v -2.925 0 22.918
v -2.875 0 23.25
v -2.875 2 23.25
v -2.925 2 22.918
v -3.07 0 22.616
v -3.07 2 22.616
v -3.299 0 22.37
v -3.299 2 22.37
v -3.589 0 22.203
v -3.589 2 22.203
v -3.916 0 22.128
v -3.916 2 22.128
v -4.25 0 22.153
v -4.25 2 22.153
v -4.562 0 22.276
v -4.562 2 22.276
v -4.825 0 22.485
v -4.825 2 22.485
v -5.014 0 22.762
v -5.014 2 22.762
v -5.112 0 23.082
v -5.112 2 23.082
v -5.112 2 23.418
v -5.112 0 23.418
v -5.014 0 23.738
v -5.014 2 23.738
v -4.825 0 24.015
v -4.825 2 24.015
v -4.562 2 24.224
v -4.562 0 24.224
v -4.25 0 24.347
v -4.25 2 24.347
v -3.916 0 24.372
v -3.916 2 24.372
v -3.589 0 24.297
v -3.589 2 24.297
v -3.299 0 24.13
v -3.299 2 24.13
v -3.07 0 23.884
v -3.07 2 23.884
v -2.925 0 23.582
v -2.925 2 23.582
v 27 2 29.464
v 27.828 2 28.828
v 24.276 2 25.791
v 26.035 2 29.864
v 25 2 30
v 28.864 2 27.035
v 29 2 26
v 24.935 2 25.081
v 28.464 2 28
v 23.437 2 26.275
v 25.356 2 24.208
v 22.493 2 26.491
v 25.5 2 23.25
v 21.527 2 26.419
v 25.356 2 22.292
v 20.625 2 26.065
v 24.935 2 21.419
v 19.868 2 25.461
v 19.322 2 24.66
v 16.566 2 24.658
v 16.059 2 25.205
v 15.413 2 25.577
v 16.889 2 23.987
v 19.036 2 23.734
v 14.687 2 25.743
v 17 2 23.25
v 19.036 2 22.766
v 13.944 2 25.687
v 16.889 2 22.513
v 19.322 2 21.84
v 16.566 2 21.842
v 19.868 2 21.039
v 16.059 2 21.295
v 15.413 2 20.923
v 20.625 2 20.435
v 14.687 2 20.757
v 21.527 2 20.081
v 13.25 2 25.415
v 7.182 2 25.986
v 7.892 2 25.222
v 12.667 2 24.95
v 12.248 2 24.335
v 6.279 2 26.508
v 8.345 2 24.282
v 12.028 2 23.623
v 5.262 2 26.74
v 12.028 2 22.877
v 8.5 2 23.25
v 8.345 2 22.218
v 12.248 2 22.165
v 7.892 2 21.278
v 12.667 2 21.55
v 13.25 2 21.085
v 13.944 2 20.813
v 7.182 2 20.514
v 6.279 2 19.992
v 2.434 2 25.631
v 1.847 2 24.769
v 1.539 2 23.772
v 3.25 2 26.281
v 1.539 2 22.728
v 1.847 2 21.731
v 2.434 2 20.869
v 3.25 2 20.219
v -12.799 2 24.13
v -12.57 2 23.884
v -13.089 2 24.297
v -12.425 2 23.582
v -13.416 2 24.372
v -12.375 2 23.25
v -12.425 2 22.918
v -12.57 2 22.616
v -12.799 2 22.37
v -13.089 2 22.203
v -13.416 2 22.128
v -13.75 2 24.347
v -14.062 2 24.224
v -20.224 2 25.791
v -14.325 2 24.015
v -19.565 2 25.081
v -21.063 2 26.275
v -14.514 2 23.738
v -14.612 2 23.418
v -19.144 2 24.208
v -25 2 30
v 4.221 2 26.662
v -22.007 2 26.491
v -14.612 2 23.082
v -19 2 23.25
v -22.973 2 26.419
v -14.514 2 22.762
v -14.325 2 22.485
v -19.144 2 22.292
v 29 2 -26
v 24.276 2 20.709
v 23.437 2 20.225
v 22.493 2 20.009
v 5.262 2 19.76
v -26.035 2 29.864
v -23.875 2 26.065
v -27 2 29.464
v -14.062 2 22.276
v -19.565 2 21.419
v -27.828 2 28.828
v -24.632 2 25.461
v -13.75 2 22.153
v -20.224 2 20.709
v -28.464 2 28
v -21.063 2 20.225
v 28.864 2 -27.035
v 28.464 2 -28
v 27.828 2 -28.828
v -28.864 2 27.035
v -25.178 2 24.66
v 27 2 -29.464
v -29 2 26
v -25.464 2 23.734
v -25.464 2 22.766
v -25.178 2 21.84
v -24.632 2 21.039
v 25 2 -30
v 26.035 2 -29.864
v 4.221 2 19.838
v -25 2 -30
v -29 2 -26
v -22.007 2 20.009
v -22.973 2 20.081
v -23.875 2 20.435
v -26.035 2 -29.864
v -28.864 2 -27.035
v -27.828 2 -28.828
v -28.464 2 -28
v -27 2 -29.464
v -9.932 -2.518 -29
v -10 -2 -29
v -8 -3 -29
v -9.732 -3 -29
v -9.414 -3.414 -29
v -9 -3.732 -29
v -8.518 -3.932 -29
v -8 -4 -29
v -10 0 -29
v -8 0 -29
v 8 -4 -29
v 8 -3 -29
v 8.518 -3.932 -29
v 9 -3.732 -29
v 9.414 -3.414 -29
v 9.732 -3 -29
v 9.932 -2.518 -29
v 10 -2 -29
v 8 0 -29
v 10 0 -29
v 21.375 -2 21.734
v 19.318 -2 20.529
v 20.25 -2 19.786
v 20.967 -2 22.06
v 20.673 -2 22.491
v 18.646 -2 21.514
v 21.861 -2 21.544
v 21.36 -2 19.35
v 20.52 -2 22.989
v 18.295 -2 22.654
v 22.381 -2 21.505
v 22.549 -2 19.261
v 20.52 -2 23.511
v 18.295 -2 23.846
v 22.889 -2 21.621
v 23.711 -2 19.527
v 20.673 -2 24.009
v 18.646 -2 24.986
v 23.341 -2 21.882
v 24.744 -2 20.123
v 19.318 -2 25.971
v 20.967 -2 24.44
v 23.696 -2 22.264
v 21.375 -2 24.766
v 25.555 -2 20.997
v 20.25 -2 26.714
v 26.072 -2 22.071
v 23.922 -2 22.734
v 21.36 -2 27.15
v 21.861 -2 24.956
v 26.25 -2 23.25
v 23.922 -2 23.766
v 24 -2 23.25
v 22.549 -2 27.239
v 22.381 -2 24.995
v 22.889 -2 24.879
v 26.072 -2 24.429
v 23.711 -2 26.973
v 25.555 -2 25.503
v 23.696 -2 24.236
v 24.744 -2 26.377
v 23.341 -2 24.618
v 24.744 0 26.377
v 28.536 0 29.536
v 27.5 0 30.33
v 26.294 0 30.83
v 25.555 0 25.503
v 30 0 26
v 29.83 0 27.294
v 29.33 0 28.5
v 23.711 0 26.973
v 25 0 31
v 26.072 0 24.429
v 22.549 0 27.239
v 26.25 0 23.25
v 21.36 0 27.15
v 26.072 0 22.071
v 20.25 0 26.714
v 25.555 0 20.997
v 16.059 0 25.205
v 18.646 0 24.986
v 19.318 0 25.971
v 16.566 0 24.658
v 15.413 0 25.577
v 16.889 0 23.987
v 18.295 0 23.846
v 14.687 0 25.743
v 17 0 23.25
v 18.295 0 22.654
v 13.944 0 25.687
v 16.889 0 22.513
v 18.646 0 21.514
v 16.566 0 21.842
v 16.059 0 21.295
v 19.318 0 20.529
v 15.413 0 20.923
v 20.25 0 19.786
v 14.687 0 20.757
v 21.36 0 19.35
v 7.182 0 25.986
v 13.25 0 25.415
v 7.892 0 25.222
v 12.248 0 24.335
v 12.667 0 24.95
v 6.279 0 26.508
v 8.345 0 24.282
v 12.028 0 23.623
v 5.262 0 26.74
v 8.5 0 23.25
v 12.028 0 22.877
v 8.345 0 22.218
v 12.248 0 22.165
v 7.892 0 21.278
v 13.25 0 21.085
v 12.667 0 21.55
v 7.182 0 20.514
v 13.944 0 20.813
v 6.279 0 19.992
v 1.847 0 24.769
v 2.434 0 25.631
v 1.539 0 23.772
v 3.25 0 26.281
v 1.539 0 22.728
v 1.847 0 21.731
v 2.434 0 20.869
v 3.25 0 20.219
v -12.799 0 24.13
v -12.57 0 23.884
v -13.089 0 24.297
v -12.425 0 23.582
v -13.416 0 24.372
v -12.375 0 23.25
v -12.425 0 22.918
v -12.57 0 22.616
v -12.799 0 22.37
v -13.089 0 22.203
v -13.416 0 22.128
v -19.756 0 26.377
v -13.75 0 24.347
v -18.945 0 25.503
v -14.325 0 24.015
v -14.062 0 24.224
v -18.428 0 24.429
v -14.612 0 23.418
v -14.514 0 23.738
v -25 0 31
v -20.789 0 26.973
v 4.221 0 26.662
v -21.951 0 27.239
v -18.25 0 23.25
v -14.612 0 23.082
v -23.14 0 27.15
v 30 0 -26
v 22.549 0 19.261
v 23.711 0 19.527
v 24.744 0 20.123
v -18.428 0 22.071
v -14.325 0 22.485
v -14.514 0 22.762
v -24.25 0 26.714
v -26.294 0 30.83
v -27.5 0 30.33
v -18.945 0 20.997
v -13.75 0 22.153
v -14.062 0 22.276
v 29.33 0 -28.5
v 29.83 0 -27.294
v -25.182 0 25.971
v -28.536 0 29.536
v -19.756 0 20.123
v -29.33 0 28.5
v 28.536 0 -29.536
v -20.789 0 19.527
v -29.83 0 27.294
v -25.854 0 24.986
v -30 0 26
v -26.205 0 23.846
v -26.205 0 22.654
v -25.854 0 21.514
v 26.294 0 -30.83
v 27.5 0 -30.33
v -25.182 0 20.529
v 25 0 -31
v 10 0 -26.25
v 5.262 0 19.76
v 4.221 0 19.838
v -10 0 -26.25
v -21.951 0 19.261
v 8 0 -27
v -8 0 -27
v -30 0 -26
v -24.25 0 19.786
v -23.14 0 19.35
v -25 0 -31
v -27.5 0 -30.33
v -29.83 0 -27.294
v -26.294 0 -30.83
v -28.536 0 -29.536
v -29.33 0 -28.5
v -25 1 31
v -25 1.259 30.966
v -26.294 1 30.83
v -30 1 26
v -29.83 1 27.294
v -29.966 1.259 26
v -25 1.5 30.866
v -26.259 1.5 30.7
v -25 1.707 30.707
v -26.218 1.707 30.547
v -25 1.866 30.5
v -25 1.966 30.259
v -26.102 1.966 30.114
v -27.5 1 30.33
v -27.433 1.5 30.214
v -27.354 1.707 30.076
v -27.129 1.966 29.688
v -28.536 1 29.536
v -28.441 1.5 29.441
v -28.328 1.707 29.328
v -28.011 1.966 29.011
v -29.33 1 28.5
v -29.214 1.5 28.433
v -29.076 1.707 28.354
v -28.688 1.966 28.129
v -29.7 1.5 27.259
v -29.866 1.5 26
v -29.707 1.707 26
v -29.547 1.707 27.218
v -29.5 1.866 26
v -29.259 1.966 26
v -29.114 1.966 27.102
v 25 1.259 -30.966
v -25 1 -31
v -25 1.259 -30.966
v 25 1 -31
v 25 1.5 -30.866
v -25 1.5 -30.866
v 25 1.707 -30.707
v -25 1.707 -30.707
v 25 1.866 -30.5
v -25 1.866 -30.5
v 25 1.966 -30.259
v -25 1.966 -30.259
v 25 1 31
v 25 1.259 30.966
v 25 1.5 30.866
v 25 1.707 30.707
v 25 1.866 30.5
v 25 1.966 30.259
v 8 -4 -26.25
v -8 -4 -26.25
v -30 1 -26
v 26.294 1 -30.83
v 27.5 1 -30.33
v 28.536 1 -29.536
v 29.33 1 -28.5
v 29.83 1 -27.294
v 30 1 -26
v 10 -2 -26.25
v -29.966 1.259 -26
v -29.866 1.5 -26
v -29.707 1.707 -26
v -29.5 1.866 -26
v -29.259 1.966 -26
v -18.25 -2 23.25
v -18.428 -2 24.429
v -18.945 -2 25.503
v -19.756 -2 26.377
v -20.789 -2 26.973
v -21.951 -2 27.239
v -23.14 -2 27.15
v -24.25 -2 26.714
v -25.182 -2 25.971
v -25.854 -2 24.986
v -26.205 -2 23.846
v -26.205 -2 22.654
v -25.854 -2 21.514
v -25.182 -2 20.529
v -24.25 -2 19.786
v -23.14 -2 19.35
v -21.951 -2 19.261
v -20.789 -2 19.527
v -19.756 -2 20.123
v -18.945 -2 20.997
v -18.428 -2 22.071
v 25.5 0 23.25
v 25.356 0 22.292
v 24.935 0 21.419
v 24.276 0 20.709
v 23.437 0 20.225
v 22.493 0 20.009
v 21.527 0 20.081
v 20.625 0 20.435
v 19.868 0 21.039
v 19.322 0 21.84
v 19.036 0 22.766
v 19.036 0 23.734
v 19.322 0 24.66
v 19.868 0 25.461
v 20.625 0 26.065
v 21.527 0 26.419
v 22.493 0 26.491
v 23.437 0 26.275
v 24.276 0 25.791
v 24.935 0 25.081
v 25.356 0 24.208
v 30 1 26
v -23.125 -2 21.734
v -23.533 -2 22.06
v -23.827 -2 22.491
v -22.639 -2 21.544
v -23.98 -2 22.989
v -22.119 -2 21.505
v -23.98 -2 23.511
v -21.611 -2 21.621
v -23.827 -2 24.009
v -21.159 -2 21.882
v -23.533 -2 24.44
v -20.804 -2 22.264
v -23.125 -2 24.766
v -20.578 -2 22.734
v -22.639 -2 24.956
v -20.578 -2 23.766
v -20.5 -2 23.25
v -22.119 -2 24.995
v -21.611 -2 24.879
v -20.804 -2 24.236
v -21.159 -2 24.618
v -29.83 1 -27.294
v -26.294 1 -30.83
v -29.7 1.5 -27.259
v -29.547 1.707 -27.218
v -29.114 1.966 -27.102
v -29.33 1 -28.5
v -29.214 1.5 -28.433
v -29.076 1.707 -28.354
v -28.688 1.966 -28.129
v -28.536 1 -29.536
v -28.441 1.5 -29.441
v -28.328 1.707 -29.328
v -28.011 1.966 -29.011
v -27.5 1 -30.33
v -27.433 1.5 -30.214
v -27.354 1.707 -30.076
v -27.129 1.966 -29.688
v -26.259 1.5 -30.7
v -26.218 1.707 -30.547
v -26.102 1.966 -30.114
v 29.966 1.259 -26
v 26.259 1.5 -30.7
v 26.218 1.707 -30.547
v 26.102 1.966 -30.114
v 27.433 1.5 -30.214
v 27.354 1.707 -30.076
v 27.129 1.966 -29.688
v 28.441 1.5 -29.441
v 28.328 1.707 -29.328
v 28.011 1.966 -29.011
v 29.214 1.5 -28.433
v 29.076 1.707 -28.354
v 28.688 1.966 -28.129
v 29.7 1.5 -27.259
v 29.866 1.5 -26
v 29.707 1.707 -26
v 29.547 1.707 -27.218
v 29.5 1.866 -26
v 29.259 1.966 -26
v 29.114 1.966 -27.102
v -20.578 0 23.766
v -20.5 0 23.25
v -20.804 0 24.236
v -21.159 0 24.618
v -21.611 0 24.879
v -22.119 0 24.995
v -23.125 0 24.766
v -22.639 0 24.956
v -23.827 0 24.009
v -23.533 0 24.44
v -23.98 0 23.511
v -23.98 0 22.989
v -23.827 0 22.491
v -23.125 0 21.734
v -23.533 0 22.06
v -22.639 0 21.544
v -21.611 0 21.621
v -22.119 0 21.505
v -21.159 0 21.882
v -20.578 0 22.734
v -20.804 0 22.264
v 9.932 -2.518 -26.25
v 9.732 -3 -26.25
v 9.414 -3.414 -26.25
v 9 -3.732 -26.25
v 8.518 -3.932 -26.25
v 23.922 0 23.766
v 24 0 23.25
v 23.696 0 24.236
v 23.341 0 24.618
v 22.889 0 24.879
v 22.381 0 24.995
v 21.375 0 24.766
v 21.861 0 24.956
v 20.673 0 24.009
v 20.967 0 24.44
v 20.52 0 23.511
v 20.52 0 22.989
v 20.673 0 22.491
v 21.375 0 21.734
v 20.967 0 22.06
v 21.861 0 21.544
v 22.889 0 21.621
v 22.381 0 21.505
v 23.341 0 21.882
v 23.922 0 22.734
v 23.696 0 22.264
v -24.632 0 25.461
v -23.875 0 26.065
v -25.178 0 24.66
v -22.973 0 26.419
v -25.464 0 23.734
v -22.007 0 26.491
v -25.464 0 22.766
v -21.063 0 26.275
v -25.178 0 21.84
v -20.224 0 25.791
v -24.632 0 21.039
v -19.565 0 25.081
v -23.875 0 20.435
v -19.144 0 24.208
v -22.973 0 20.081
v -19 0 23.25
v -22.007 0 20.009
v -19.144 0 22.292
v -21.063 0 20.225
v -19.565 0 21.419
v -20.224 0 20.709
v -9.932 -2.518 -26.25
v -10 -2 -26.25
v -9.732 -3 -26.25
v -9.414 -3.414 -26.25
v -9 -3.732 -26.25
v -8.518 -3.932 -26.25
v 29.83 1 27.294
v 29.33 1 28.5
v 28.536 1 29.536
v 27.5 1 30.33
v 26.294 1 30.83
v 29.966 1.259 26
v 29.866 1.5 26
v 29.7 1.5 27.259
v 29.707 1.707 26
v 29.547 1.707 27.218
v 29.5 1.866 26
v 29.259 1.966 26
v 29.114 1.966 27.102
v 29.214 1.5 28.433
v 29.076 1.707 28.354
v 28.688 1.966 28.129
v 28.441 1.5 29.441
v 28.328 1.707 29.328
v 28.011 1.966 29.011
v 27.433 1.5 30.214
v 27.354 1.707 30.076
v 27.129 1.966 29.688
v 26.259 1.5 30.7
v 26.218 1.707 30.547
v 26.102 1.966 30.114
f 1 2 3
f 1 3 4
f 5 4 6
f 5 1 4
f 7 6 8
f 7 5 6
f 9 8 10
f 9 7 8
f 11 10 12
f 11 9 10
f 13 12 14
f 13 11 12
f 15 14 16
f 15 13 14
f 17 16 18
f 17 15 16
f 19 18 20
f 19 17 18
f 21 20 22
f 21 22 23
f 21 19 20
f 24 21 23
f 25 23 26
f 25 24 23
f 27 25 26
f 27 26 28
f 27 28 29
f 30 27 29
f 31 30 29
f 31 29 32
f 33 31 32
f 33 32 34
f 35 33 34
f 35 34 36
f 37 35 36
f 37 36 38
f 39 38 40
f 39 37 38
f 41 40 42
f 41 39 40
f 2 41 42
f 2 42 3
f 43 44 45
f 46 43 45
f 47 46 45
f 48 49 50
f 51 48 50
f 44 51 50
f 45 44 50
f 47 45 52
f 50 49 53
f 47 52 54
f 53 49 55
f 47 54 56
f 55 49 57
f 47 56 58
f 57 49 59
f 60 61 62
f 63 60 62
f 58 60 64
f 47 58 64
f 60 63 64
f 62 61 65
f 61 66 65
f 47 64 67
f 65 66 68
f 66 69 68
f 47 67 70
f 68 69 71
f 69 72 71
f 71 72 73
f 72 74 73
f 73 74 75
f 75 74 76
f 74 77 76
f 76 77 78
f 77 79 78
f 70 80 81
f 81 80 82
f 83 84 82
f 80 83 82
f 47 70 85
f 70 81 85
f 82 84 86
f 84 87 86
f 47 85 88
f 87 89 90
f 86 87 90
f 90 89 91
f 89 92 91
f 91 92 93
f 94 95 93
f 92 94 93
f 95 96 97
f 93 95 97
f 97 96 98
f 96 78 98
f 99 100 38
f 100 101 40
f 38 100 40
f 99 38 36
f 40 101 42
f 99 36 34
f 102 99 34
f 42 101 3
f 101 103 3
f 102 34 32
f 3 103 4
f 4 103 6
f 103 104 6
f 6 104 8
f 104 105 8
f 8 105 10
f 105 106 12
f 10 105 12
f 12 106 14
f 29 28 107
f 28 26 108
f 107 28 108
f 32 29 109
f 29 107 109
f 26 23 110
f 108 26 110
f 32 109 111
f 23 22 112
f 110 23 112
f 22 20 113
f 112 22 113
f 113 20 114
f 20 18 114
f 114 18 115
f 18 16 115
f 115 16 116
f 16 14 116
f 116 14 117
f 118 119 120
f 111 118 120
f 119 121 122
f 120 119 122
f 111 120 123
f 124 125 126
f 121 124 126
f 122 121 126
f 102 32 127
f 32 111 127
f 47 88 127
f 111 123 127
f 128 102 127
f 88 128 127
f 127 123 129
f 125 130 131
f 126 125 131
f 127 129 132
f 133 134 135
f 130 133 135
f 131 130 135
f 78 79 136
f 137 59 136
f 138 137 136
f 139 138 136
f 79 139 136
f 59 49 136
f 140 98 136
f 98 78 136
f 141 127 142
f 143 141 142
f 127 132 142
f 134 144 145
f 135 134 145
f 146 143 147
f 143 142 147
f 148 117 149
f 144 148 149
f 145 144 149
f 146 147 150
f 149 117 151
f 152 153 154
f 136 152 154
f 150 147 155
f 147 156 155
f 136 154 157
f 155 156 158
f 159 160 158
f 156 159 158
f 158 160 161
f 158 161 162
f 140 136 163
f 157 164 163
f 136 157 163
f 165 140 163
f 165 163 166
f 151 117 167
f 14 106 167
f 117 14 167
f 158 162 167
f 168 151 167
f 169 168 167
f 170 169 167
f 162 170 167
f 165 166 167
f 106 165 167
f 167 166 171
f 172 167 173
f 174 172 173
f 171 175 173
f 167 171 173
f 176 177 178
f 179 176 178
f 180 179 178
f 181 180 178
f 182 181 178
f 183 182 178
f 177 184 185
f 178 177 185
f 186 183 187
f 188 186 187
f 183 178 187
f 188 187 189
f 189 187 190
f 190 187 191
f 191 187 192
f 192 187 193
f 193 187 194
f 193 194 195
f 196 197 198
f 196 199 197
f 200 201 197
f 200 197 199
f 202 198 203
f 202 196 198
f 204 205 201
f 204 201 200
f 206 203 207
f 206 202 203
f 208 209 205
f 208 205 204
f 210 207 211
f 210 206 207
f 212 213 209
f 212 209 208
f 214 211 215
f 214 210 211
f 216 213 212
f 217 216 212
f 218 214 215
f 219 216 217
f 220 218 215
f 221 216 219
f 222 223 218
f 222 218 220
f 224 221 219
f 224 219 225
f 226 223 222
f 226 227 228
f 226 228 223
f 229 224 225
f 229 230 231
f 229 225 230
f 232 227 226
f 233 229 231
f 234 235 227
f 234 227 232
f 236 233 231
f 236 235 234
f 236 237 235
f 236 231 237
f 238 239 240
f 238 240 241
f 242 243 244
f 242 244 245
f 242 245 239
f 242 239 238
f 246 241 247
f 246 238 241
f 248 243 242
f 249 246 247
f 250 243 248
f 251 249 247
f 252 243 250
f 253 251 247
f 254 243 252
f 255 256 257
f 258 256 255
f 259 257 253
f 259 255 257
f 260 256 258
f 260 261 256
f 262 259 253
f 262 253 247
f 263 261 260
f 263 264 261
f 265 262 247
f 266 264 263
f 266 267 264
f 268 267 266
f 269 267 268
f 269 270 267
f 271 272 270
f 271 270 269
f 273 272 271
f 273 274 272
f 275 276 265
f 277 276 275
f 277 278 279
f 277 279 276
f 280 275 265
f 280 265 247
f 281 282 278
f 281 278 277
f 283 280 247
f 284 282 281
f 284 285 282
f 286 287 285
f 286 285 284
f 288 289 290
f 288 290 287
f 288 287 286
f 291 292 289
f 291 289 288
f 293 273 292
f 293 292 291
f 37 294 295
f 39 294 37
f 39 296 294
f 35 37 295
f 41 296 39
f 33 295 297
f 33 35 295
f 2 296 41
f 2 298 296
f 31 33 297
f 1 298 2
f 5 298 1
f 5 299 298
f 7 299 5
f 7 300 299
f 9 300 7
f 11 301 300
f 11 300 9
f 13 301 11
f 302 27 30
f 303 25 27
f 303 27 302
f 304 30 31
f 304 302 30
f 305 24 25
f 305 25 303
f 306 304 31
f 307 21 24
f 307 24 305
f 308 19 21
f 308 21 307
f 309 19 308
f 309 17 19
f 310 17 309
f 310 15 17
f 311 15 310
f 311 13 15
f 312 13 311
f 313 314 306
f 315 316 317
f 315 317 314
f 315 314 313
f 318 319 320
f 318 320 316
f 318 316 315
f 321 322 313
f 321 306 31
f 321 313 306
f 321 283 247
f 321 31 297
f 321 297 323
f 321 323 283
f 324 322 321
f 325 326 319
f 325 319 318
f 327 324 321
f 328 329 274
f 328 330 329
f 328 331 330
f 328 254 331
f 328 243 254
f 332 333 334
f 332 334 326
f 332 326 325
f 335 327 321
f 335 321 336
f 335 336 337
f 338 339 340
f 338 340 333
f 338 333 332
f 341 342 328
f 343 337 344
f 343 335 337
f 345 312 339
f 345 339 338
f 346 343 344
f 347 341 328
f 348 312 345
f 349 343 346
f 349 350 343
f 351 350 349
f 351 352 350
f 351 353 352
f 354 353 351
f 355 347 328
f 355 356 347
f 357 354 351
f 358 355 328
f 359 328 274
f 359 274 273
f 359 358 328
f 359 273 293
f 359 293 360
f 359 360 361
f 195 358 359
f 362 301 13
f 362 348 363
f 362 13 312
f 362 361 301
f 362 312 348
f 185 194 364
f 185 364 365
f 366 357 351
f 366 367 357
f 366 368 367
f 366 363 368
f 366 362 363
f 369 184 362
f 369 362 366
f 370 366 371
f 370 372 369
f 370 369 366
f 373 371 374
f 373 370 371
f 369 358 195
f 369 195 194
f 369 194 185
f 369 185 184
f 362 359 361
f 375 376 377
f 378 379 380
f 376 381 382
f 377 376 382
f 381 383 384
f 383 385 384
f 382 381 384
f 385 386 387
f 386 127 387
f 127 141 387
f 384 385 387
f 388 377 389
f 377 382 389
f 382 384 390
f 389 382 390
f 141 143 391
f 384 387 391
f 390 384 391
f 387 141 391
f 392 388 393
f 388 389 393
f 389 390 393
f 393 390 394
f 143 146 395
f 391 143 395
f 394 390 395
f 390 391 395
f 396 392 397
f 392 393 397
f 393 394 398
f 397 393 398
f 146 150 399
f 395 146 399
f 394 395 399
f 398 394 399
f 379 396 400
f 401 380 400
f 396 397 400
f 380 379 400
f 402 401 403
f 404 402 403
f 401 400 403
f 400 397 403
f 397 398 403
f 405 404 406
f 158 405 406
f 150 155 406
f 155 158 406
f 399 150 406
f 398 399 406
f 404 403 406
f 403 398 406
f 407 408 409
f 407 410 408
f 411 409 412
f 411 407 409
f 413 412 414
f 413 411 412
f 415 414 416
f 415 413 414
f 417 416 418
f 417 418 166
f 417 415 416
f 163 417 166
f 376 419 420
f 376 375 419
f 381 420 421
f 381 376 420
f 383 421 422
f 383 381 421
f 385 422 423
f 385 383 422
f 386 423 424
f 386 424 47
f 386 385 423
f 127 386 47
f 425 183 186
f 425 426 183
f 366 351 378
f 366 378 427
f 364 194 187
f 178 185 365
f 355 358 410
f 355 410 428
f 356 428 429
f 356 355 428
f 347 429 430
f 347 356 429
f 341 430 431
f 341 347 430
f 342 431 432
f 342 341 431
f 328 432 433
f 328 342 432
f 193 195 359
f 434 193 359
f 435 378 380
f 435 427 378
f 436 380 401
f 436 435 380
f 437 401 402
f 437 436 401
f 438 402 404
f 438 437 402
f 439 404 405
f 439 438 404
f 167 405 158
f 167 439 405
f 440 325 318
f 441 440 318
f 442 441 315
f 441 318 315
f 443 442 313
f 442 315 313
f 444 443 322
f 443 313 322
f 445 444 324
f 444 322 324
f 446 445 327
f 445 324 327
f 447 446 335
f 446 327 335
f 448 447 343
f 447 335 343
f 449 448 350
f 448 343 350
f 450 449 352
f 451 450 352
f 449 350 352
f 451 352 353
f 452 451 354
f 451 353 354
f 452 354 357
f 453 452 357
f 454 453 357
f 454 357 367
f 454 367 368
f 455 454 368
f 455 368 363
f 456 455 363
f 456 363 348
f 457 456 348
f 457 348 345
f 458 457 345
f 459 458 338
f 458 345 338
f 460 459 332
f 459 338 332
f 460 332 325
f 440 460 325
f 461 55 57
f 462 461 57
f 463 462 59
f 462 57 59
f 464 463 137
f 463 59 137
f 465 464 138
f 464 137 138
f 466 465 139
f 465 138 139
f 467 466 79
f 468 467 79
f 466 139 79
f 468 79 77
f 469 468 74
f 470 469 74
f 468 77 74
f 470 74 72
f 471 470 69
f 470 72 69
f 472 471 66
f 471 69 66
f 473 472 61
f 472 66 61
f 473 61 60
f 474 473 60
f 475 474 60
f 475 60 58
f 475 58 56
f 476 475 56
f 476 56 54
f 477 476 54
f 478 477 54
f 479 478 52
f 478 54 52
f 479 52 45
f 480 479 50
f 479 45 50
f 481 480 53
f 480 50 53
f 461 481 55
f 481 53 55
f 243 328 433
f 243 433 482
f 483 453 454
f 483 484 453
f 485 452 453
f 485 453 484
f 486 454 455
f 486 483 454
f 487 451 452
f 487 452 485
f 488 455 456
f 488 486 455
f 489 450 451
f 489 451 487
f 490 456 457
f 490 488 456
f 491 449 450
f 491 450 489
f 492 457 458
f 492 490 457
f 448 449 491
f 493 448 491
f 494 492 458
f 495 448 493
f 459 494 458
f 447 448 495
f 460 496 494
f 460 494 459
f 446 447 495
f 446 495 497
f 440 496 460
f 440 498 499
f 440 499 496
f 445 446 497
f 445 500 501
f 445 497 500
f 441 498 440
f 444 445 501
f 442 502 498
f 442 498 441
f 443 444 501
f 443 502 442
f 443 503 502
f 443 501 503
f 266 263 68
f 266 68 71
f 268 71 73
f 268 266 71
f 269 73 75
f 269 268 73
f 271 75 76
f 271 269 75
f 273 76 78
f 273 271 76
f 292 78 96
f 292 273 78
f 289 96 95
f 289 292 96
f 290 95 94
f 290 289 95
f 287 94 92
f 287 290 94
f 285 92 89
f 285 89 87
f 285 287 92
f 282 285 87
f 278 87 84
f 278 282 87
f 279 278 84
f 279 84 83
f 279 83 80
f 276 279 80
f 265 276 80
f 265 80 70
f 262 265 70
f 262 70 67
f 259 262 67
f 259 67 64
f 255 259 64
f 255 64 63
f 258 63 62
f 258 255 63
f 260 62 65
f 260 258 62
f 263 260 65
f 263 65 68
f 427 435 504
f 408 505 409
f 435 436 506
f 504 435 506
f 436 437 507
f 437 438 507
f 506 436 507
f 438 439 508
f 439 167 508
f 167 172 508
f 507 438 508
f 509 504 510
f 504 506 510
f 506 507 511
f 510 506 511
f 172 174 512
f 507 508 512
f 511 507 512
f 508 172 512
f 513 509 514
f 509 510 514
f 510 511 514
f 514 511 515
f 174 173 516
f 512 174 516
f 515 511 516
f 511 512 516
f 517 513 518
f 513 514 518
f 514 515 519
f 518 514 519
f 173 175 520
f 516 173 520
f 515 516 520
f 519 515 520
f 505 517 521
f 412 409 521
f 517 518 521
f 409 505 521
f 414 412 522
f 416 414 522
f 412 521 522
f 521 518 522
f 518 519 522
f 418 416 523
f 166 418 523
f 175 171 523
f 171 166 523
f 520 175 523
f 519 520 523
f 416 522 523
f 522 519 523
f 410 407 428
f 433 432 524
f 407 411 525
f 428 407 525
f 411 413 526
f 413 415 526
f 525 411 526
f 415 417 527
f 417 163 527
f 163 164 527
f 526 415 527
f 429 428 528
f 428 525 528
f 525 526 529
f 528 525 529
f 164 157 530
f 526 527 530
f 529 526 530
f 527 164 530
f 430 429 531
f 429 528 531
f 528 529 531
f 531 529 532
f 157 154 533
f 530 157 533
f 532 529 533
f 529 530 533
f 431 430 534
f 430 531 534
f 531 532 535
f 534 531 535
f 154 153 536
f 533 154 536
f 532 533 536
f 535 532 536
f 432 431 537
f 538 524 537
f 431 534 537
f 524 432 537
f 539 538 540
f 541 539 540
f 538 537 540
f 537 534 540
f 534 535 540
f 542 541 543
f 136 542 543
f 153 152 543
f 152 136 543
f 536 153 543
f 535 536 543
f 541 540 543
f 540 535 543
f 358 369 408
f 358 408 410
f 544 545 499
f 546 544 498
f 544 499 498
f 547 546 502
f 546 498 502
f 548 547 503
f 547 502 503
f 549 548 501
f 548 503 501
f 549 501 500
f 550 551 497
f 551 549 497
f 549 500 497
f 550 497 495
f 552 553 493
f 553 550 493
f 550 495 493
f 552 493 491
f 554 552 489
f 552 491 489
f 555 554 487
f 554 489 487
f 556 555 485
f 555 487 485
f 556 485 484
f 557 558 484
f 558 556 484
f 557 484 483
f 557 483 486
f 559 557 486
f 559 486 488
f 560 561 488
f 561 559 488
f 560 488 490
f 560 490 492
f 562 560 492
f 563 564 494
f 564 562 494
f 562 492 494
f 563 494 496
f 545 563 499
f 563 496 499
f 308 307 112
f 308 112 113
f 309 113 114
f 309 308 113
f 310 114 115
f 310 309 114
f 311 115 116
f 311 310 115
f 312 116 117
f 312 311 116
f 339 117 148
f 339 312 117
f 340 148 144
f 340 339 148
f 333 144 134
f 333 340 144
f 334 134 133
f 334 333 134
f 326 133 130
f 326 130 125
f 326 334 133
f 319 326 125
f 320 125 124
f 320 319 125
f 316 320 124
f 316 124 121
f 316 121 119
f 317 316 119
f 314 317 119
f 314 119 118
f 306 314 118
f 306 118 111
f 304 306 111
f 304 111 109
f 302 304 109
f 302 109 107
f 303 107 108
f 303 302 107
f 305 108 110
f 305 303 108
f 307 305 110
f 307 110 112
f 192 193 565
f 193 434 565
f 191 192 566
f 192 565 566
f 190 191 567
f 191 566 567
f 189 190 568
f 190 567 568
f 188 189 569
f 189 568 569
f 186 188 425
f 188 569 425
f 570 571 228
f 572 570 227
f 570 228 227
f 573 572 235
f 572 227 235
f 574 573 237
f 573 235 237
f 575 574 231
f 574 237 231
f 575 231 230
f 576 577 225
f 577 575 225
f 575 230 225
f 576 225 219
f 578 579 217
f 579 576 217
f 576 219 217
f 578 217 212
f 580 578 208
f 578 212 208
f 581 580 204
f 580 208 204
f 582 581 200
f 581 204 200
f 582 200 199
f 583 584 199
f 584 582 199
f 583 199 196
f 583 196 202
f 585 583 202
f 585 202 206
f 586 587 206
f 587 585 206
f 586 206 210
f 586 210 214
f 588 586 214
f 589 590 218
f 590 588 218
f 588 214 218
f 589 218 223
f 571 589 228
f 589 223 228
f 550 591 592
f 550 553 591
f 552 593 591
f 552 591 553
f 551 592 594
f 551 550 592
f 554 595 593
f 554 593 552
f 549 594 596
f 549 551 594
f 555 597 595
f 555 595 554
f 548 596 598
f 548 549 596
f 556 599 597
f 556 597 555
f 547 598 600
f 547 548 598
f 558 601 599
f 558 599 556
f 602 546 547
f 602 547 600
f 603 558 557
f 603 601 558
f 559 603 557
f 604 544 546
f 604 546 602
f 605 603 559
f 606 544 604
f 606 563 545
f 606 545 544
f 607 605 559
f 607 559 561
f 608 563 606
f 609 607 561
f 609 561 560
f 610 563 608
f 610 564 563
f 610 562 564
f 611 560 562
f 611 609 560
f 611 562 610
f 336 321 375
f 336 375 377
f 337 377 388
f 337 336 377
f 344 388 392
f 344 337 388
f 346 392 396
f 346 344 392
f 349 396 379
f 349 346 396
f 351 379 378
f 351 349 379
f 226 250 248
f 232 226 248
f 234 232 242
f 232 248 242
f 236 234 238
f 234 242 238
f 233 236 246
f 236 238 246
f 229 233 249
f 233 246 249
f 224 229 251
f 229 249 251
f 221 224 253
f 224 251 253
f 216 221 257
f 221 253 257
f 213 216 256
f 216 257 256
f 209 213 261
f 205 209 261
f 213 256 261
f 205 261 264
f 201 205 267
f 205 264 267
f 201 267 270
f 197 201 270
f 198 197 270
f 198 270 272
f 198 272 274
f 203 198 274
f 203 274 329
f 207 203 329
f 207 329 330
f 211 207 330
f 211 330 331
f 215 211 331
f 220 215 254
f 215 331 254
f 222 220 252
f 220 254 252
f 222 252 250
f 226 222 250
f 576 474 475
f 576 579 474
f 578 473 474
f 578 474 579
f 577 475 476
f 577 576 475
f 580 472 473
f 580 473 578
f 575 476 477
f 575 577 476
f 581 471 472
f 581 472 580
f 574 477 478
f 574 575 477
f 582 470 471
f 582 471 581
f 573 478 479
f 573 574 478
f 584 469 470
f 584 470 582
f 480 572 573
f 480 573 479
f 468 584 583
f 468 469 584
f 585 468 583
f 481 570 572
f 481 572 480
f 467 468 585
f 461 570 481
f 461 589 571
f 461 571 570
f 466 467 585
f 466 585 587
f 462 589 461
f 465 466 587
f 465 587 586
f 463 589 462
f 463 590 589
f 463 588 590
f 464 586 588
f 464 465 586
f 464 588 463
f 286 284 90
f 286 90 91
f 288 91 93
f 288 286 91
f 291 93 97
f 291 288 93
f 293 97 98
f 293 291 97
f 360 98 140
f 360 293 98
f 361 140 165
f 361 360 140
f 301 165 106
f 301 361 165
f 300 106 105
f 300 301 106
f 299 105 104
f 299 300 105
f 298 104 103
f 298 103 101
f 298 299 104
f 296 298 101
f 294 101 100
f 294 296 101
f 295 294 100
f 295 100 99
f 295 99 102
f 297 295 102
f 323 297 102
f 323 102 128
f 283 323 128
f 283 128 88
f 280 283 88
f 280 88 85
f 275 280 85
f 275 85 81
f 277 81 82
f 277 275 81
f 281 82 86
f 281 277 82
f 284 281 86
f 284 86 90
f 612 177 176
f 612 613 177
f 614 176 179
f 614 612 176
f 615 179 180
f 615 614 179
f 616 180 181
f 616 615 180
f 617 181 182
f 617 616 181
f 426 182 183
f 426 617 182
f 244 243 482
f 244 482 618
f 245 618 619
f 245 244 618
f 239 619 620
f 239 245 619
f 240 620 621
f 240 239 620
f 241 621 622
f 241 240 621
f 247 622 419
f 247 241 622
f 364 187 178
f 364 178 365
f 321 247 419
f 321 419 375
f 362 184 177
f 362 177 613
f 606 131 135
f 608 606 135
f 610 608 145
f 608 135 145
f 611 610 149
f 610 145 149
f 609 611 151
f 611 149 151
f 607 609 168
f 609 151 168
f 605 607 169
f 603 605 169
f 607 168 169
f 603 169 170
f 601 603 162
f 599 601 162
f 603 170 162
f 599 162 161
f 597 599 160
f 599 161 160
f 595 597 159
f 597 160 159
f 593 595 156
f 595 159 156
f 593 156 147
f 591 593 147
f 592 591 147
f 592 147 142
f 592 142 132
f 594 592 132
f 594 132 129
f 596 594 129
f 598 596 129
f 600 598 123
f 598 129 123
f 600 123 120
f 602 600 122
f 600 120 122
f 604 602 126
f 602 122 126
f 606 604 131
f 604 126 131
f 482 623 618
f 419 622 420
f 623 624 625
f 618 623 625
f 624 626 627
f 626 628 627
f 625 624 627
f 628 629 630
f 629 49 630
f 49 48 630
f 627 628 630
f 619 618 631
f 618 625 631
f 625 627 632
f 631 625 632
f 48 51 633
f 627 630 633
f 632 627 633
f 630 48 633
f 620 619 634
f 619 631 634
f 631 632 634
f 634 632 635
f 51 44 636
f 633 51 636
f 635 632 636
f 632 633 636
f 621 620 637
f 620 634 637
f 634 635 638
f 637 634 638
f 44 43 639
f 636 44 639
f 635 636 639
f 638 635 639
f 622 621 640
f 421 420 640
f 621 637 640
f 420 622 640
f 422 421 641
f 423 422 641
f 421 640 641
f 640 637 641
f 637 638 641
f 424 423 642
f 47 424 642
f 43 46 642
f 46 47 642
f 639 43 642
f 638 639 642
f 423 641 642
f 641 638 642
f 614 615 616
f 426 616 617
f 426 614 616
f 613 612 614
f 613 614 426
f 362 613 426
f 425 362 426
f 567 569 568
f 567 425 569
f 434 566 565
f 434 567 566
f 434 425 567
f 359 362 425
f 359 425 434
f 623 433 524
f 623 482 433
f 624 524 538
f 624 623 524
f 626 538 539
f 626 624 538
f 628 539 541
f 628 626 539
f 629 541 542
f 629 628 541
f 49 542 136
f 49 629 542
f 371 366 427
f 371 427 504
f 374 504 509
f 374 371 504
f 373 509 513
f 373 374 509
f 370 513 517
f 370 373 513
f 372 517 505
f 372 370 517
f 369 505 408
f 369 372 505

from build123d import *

# Parameters (mm, degrees)
SKETCH1_R           = 1.125
SKETCH1_R_2         = 2.5
SKETCH1_R_3         = 3.5
BOSS_EXTRUDE1_DEPTH = 2
SKETCH2_R           = 4
BOSS_EXTRUDE2_DEPTH = 2
SKETCH3_R           = 1.75
CUT_EXTRUDE1_DEPTH  = 5
SKETCH4_R           = 3.25
SKETCH4_R_2         = 1.75
CUT_EXTRUDE2_DEPTH  = 2
SKETCH6_W           = 20
SKETCH6_H           = 2.75
BOSS_EXTRUDE3_DEPTH = 4
CUT_EXTRUDE3_DEPTH  = 16
FILLET1_R           = 2
FILLET2_R           = 1


with BuildPart() as part:
    # Sketch1 → Boss-Extrude1 (new body)
    with BuildSketch(Plane(origin=(0, 0, 0), x_dir=(1, 0, 0), z_dir=(0, 1, 0))):
        with BuildLine():
            Line((25, -31), (-25, -31))
            ThreePointArc((-25, -31), (-28.535533906, -29.535533906), (-30, -26))
            Line((-30, -26), (-30, 26))
            ThreePointArc((-30, 26), (-28.535533906, 29.535533906), (-25, 31))
            Line((-25, 31), (25, 31))
            ThreePointArc((25, 31), (28.535533906, 29.535533906), (30, 26))
            Line((30, 26), (30, -26))
            ThreePointArc((30, -26), (28.535533906, -29.535533906), (25, -31))
        make_face()
        with Locations((-13.5, -23.25)):
            Circle(SKETCH1_R, mode=Mode.SUBTRACT)
        with Locations((-4, -23.25)):
            Circle(SKETCH1_R, mode=Mode.SUBTRACT)
        with Locations((14.5, -23.25)):
            Circle(SKETCH1_R_2, mode=Mode.SUBTRACT)
        with Locations((5, -23.25)):
            Circle(SKETCH1_R_3, mode=Mode.SUBTRACT)
    extrude(amount=BOSS_EXTRUDE1_DEPTH)

    # Sketch2 → Boss-Extrude2 (add)
    with BuildSketch(Plane.XZ):
        with Locations((-22.25, 23.25)):
            Circle(SKETCH2_R)
        with Locations((22.25, 23.25)):
            Circle(SKETCH2_R)
    extrude(amount=BOSS_EXTRUDE2_DEPTH)

    # Sketch3 → Cut-Extrude1 (cut, through all)
    with BuildSketch(Plane.XZ.offset(2)):
        with Locations((-22.25, 23.25)):
            Circle(SKETCH3_R)
        with Locations((22.25, 23.25)):
            Circle(SKETCH3_R)
    extrude(amount=-CUT_EXTRUDE1_DEPTH, mode=Mode.SUBTRACT)

    # Sketch4 → Cut-Extrude2 (cut)
    with BuildSketch(Plane(origin=(0, 2, 0), x_dir=(1, 0, 0), z_dir=(0, 1, 0))):
        with Locations((-22.25, -23.25)):
            Circle(SKETCH4_R)
        with Locations((-22.25, -23.25)):
            Circle(SKETCH4_R_2, mode=Mode.SUBTRACT)
        with Locations((22.25, -23.25)):
            Circle(SKETCH4_R)
        with Locations((22.25, -23.25)):
            Circle(SKETCH4_R_2, mode=Mode.SUBTRACT)
    extrude(amount=-CUT_EXTRUDE2_DEPTH, mode=Mode.SUBTRACT)

    # Sketch6 → Boss-Extrude3 (add)
    with BuildSketch(Plane.XZ):
        with Locations((0, -27.625)):
            Rectangle(SKETCH6_W, SKETCH6_H)
    extrude(amount=BOSS_EXTRUDE3_DEPTH)

    # Sketch7 → Cut-Extrude3 (cut)
    with BuildSketch(Plane(origin=(8, 0, 0), x_dir=(0, 0, -1), z_dir=(1, 0, 0))):
        Polygon((29, -3), (27, 0), (29, 0), align=None)
    extrude(amount=-CUT_EXTRUDE3_DEPTH, mode=Mode.SUBTRACT)

    # Fillet1
    fillet1_edges = [part.edges().sort_by_distance(p)[0] for p in [
        (10, -4, -27.625),
        (-10, -4, -27.625),
    ]]
    fillet(fillet1_edges, radius=FILLET1_R)

    # Fillet2
    fillet2_edges = [part.edges().sort_by_distance(p)[0] for p in [
        (28.535533906, 2, -29.535533906),
        (0, 2, -31),
        (-28.535533906, 2, -29.535533906),
        (-30, 2, 0),
        (-28.535533906, 2, 29.535533906),
        (0, 2, 31),
        (28.535533906, 2, 29.535533906),
        (30, 2, 0),
    ]]
    fillet(fillet2_edges, radius=FILLET2_R)


solid = part.part
